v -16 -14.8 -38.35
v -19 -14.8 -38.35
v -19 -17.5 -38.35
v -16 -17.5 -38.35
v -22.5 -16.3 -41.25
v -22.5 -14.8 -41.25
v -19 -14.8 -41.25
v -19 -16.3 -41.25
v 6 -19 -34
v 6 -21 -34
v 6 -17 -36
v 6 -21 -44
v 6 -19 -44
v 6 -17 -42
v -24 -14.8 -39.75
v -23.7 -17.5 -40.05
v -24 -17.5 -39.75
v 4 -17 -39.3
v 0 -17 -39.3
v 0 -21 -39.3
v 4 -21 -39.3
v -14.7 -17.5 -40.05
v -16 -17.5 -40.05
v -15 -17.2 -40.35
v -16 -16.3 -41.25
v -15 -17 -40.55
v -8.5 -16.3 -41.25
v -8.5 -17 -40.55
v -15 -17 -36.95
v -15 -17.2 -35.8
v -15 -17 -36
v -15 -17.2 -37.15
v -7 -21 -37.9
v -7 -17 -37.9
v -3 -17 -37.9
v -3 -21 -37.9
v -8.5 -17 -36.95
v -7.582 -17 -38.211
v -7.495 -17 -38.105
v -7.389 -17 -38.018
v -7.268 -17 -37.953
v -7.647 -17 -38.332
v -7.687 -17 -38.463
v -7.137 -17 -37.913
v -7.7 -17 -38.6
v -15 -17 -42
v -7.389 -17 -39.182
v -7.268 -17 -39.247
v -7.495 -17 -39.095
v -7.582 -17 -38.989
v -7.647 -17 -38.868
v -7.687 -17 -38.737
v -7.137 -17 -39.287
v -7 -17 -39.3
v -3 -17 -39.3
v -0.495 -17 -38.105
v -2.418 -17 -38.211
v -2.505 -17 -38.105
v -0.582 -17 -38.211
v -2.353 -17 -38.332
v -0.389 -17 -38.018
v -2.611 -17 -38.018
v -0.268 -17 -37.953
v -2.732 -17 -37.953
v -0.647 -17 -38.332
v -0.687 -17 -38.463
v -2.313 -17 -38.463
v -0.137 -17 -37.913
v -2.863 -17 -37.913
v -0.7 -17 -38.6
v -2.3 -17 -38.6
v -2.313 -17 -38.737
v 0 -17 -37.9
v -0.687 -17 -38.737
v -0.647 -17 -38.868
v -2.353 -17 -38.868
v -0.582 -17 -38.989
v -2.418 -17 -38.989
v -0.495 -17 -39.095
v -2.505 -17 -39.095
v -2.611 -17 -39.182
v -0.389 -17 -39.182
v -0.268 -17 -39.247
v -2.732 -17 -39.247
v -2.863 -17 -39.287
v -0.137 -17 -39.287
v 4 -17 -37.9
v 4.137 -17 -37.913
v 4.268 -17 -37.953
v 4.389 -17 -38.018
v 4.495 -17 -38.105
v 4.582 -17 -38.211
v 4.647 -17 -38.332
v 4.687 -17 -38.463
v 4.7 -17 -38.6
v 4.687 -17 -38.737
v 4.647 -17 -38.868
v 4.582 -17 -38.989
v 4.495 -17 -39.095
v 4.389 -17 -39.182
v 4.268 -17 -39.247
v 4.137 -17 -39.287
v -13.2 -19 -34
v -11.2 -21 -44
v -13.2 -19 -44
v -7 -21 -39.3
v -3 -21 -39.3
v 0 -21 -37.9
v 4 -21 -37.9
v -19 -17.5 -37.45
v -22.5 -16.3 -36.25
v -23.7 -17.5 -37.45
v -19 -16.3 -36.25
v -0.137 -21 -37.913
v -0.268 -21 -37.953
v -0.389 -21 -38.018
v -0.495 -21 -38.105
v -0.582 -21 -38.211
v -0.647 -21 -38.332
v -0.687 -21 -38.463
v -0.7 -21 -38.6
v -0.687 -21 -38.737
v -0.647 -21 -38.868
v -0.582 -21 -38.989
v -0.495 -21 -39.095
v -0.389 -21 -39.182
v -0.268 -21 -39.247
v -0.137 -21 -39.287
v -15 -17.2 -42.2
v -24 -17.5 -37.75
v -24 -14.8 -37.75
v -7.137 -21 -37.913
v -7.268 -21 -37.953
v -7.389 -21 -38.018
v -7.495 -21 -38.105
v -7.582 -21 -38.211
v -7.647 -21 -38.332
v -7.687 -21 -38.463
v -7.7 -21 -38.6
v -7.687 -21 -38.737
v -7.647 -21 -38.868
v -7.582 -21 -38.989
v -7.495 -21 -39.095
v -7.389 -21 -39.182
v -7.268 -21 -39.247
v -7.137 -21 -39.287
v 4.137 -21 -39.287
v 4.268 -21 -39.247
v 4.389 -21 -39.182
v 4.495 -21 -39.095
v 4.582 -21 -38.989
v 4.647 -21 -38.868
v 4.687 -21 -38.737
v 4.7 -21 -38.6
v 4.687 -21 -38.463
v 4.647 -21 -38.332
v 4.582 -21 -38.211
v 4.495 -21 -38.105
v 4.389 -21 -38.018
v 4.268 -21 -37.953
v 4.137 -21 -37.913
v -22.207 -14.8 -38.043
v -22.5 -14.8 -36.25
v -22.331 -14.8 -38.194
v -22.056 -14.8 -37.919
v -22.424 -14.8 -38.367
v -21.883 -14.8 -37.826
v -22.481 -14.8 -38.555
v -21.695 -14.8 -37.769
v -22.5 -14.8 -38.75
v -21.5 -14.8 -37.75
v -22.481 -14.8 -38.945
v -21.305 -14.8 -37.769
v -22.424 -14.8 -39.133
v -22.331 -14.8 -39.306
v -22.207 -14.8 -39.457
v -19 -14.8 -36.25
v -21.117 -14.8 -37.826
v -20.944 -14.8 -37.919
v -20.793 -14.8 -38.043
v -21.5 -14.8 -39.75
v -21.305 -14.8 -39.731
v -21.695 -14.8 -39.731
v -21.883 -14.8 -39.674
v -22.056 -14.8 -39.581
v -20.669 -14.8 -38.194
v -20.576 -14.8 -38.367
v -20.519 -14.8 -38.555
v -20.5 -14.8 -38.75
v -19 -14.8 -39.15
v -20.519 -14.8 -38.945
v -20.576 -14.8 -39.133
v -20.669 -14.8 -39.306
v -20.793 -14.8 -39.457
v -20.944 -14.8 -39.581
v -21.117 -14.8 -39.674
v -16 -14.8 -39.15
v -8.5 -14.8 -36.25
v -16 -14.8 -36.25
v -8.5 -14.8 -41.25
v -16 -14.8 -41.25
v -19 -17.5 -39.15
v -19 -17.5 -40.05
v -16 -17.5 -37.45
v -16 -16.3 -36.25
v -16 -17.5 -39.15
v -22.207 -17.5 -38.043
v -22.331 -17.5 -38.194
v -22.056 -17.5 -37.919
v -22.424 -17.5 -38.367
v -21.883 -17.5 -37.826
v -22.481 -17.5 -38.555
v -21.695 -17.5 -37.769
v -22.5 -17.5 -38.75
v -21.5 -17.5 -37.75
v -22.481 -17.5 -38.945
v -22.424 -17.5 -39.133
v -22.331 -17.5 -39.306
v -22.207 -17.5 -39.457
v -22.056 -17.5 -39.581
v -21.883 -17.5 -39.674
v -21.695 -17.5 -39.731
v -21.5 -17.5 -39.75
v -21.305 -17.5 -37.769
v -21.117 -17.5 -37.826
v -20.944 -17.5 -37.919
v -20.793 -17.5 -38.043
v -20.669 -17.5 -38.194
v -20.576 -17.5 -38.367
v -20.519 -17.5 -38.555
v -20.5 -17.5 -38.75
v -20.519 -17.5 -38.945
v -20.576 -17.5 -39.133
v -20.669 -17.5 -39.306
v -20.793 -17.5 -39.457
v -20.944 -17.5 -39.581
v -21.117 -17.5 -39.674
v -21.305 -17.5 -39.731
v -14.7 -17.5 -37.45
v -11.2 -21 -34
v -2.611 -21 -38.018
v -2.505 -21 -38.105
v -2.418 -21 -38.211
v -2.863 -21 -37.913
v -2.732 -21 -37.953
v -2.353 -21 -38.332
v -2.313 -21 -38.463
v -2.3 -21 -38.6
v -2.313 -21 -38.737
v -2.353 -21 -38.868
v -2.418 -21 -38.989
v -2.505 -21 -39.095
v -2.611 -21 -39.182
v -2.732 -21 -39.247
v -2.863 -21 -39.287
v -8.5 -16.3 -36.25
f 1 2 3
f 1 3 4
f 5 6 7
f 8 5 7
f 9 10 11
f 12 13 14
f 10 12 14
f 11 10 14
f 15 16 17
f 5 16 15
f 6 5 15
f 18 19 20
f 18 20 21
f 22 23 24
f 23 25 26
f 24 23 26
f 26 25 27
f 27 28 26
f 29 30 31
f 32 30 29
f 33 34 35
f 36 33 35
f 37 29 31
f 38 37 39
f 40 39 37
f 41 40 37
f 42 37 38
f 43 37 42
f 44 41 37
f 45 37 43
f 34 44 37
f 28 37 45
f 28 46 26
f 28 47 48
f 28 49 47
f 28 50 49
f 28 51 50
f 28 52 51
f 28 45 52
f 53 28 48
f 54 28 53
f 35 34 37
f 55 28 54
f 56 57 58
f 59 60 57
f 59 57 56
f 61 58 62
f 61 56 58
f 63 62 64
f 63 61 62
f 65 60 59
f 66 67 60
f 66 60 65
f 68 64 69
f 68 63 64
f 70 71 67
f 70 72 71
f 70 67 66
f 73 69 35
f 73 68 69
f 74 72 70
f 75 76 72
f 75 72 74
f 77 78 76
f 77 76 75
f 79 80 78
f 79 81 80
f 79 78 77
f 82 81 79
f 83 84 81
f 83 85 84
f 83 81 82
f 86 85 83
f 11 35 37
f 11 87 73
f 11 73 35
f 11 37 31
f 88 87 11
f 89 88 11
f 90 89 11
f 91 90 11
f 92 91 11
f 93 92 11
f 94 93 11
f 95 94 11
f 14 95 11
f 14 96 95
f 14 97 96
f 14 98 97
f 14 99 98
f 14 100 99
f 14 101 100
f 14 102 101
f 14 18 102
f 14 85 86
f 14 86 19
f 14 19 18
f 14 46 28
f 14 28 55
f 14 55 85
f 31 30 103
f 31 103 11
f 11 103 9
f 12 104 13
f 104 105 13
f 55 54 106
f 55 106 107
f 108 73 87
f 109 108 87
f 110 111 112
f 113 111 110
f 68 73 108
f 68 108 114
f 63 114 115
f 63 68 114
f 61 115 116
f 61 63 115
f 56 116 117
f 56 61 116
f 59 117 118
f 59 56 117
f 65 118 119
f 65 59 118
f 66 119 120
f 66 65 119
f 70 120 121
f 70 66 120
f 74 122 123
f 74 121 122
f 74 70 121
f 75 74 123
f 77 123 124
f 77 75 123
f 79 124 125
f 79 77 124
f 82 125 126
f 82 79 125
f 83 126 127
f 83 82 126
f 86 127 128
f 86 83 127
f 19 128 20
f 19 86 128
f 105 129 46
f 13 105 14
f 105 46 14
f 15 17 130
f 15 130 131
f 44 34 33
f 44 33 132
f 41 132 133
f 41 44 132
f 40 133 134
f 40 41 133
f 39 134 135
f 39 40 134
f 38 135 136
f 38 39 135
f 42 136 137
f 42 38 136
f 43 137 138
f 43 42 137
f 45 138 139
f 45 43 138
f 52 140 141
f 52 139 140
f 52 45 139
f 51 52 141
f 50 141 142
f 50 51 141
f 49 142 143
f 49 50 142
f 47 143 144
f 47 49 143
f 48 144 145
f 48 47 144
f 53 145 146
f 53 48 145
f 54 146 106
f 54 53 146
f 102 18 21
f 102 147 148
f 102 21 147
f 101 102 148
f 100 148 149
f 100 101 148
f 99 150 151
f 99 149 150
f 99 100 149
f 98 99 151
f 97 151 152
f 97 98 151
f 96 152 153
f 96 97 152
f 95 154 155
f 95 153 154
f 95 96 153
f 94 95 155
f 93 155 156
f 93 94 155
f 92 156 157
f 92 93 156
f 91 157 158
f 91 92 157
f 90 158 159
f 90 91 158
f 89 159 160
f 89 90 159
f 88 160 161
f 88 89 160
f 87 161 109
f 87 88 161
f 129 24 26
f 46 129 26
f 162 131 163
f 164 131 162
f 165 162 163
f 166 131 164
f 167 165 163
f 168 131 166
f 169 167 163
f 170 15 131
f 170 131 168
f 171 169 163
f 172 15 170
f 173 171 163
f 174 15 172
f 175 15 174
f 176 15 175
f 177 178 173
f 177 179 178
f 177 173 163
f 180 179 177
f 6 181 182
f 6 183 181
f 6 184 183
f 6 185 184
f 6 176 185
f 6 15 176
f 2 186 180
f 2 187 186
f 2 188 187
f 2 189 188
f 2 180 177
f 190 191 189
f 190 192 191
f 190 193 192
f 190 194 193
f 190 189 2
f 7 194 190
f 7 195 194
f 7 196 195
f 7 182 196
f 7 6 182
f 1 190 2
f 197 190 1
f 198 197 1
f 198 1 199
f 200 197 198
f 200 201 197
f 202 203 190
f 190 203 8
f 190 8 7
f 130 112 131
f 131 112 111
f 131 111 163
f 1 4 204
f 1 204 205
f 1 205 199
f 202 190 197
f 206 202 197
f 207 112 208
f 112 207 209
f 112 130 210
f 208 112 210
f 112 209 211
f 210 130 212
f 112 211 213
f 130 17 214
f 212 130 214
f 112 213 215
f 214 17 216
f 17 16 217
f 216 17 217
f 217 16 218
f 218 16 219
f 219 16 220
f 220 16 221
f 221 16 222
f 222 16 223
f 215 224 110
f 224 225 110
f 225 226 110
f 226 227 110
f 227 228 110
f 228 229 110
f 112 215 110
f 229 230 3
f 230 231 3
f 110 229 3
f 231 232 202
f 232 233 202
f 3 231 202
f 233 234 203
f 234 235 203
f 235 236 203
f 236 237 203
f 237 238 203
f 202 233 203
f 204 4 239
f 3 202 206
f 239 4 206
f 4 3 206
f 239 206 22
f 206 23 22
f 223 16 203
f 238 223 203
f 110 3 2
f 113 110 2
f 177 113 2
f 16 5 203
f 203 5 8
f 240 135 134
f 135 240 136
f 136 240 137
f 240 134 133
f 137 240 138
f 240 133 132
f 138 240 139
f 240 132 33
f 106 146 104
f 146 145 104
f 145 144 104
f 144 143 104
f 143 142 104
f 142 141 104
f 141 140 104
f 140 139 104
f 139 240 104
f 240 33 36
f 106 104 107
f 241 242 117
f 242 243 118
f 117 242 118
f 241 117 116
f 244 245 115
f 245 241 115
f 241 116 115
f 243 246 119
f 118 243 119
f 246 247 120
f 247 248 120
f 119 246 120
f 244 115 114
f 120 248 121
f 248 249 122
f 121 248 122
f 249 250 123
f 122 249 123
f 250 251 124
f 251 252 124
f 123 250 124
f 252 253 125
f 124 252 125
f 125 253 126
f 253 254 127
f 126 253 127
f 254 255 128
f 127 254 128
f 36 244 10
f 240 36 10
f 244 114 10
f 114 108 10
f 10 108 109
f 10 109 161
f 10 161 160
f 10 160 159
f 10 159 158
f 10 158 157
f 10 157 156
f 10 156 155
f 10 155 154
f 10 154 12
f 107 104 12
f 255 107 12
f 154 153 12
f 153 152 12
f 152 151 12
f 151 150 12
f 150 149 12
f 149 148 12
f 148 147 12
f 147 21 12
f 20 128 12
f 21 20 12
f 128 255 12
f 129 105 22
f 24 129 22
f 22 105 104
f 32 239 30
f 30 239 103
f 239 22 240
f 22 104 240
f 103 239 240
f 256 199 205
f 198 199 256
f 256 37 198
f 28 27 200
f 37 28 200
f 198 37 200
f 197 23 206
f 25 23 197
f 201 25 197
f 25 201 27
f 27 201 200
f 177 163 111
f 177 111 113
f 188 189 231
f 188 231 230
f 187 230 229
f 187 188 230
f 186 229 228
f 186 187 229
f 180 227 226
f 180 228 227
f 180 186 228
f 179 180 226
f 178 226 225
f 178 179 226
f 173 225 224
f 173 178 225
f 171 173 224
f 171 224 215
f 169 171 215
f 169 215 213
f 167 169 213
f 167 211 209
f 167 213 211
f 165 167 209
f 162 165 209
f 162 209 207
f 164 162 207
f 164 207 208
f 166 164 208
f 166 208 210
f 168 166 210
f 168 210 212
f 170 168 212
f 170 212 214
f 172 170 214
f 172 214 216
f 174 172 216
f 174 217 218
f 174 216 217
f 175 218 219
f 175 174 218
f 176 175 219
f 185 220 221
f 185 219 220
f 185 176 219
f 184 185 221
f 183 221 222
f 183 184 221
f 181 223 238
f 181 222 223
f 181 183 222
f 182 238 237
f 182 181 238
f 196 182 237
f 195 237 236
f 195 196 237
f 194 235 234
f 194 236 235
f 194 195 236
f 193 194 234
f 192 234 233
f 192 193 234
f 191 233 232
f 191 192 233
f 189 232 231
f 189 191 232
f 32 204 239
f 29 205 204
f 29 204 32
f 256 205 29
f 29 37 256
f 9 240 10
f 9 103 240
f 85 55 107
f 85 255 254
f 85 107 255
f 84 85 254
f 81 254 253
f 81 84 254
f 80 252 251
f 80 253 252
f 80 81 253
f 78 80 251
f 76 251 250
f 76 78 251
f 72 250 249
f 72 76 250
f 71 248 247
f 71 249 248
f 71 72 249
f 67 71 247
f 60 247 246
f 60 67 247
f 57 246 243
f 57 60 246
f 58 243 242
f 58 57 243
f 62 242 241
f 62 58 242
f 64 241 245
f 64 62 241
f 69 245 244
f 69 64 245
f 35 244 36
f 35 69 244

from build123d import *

# Parameters (mm, degrees)
BOX013_W               = 3
BOX013_H               = 10
BOX013_DEPTH           = 2.85
BOX014_W               = 3
BOX014_H               = 10
BOX014_DEPTH           = 3.25
BOX012_W               = 4
BOX012_H               = 10
BOX012_DEPTH           = 1.4
CYLINDER012_R          = 0.7
CYLINDER012_DEPTH      = 10
CYLINDER012_ROLL_ANGLE = 90
CYLINDER013_R          = 0.7
CYLINDER013_DEPTH      = 10
CYLINDER013_ROLL_ANGLE = 90
BOX011_W               = 21
BOX011_H               = 4
BOX011_DEPTH           = 10
CHAMFER003_SIZE        = 3.8
CYLINDER014_R          = 1
CYLINDER014_DEPTH      = 5
CYLINDER014_ROLL_ANGLE = 90
BOX010_W               = 15.5
BOX010_H               = 2.7
BOX010_DEPTH           = 5
CHAMFER001_SIZE        = 1.5
CHAMFER002_SIZE        = 1.2
CHAMFER005_SIZE        = 2


with BuildPart() as cube008:
    # Box013 → Box013 (new body)
    with BuildSketch(Plane(origin=(-19, -19, -42), x_dir=(1, 0, 0), z_dir=(0, 0, 1))):
        with Locations((1.5, 5)):
            Rectangle(BOX013_W, BOX013_H)
    extrude(amount=BOX013_DEPTH)


with BuildPart() as fusion007008:
    # Box014 → Box014 (new body)
    with BuildSketch(Plane(origin=(-19, -19, -38.35), x_dir=(1, 0, 0), z_dir=(0, 0, 1))):
        with Locations((1.5, 5)):
            Rectangle(BOX014_W, BOX014_H)
    extrude(amount=BOX014_DEPTH)

    # Fusion007008: union Cube008
    add(cube008.part)


with BuildPart() as cube007:
    # Box012 → Box012 (new body)
    with BuildSketch(Plane(origin=(-7, -24.5, -39.3), x_dir=(1, 0, 0), z_dir=(0, 0, 1))):
        with Locations((2, 5)):
            Rectangle(BOX012_W, BOX012_H)
    extrude(amount=BOX012_DEPTH)


with BuildPart() as cylinder003:
    # Cylinder012 → Cylinder012 (new body)
    with BuildSketch(Plane.XY):
        Circle(CYLINDER012_R)
    extrude(amount=CYLINDER012_DEPTH)


with BuildPart() as cylinder003_1:
    # Cylinder012 roll: moved
    add(cylinder003.part.rotate(Axis((0, 0, 0), (1, 0, 0)), CYLINDER012_ROLL_ANGLE))


with BuildPart() as cylinder003_2:
    # Cylinder012 placement: moved
    add(cylinder003_1.part.moved(Location((-3, -14.5, -38.6))))


with BuildPart() as cylinder004:
    # Cylinder013 → Cylinder013 (new body)
    with BuildSketch(Plane.XY):
        Circle(CYLINDER013_R)
    extrude(amount=CYLINDER013_DEPTH)


with BuildPart() as cylinder004_1:
    # Cylinder013 roll: moved
    add(cylinder004.part.rotate(Axis((0, 0, 0), (1, 0, 0)), CYLINDER013_ROLL_ANGLE))


with BuildPart() as cylinder004_2:
    # Cylinder013 placement: moved
    add(cylinder004_1.part.moved(Location((-7, -14.5, -38.6))))


with BuildPart() as fusion007005:
    # Fusion007005 base: copy of Cylinder004
    add(cylinder004_2.part)

    # Fusion007005: union Cube007, Cylinder003
    add(cube007.part)
    add(cylinder003_2.part)


with BuildPart() as fusion007005_1:
    # Fusion007005 placement: moved
    add(fusion007005.part.moved(Location((7, 0, 0))))


with BuildPart() as fusion007006:
    # Fusion007006 base: copy of Cylinder004
    add(cylinder004_2.part)

    # Fusion007006: union Cube007, Cylinder003
    add(cube007.part)
    add(cylinder003_2.part)


with BuildPart() as chamfer003:
    # Box011 → Box011 (new body)
    with BuildSketch(Plane(origin=(-15, -21, -44), x_dir=(1, 0, 0), z_dir=(0, 0, 1))):
        with Locations((10.5, 2)):
            Rectangle(BOX011_W, BOX011_H)
    extrude(amount=BOX011_DEPTH)

    # Cut007: cut Fusion007006
    add(fusion007006.part, mode=Mode.SUBTRACT)

    # Cut008: cut Fusion007005
    add(fusion007005_1.part, mode=Mode.SUBTRACT)

    # Chamfer003
    chamfer003_edges = [chamfer003.edges().sort_by_distance(p)[0] for p in [
        (-15, -21, -39),
    ]]
    chamfer(chamfer003_edges, length=CHAMFER003_SIZE)


with BuildPart() as cylinder005:
    # Cylinder014 → Cylinder014 (new body)
    with BuildSketch(Plane.XY):
        Circle(CYLINDER014_R)
    extrude(amount=CYLINDER014_DEPTH)


with BuildPart() as cylinder005_1:
    # Cylinder014 roll: moved
    add(cylinder005.part.rotate(Axis((0, 0, 0), (1, 0, 0)), CYLINDER014_ROLL_ANGLE))


with BuildPart() as cylinder005_2:
    # Cylinder014 placement: moved
    add(cylinder005_1.part.moved(Location((-21.5, -13.5, -38.75))))


with BuildPart() as final_connectingrod:
    # Box010 → Box010 (new body)
    with BuildSketch(Plane(origin=(-24, -17.5, -41.25), x_dir=(1, 0, 0), z_dir=(0, 0, 1))):
        with Locations((7.75, 1.35)):
            Rectangle(BOX010_W, BOX010_H)
    extrude(amount=BOX010_DEPTH)

    # Cut009: cut Cylinder005
    add(cylinder005_2.part, mode=Mode.SUBTRACT)

    # Chamfer001
    chamfer001_edges = [final_connectingrod.edges().sort_by_distance(p)[0] for p in [
        (-24, -16.15, -36.25),
        (-24, -16.15, -41.25),
    ]]
    chamfer(chamfer001_edges, length=CHAMFER001_SIZE)

    # Chamfer002
    chamfer002_edges = [final_connectingrod.edges().sort_by_distance(p)[0] for p in [
        (-15.5, -17.5, -41.25),
        (-15.5, -17.5, -36.25),
    ]]
    chamfer(chamfer002_edges, length=CHAMFER002_SIZE)

    # Fusion007007: union Chamfer003
    add(chamfer003.part)

    # Chamfer005
    chamfer005_edges = [final_connectingrod.edges().sort_by_distance(p)[0] for p in [
        (-4.5, -17, -34),
        (-4.5, -17, -44),
    ]]
    chamfer(chamfer005_edges, length=CHAMFER005_SIZE)

    # Cut010: cut Fusion007008
    add(fusion007008.part, mode=Mode.SUBTRACT)


solid = final_connectingrod.part
